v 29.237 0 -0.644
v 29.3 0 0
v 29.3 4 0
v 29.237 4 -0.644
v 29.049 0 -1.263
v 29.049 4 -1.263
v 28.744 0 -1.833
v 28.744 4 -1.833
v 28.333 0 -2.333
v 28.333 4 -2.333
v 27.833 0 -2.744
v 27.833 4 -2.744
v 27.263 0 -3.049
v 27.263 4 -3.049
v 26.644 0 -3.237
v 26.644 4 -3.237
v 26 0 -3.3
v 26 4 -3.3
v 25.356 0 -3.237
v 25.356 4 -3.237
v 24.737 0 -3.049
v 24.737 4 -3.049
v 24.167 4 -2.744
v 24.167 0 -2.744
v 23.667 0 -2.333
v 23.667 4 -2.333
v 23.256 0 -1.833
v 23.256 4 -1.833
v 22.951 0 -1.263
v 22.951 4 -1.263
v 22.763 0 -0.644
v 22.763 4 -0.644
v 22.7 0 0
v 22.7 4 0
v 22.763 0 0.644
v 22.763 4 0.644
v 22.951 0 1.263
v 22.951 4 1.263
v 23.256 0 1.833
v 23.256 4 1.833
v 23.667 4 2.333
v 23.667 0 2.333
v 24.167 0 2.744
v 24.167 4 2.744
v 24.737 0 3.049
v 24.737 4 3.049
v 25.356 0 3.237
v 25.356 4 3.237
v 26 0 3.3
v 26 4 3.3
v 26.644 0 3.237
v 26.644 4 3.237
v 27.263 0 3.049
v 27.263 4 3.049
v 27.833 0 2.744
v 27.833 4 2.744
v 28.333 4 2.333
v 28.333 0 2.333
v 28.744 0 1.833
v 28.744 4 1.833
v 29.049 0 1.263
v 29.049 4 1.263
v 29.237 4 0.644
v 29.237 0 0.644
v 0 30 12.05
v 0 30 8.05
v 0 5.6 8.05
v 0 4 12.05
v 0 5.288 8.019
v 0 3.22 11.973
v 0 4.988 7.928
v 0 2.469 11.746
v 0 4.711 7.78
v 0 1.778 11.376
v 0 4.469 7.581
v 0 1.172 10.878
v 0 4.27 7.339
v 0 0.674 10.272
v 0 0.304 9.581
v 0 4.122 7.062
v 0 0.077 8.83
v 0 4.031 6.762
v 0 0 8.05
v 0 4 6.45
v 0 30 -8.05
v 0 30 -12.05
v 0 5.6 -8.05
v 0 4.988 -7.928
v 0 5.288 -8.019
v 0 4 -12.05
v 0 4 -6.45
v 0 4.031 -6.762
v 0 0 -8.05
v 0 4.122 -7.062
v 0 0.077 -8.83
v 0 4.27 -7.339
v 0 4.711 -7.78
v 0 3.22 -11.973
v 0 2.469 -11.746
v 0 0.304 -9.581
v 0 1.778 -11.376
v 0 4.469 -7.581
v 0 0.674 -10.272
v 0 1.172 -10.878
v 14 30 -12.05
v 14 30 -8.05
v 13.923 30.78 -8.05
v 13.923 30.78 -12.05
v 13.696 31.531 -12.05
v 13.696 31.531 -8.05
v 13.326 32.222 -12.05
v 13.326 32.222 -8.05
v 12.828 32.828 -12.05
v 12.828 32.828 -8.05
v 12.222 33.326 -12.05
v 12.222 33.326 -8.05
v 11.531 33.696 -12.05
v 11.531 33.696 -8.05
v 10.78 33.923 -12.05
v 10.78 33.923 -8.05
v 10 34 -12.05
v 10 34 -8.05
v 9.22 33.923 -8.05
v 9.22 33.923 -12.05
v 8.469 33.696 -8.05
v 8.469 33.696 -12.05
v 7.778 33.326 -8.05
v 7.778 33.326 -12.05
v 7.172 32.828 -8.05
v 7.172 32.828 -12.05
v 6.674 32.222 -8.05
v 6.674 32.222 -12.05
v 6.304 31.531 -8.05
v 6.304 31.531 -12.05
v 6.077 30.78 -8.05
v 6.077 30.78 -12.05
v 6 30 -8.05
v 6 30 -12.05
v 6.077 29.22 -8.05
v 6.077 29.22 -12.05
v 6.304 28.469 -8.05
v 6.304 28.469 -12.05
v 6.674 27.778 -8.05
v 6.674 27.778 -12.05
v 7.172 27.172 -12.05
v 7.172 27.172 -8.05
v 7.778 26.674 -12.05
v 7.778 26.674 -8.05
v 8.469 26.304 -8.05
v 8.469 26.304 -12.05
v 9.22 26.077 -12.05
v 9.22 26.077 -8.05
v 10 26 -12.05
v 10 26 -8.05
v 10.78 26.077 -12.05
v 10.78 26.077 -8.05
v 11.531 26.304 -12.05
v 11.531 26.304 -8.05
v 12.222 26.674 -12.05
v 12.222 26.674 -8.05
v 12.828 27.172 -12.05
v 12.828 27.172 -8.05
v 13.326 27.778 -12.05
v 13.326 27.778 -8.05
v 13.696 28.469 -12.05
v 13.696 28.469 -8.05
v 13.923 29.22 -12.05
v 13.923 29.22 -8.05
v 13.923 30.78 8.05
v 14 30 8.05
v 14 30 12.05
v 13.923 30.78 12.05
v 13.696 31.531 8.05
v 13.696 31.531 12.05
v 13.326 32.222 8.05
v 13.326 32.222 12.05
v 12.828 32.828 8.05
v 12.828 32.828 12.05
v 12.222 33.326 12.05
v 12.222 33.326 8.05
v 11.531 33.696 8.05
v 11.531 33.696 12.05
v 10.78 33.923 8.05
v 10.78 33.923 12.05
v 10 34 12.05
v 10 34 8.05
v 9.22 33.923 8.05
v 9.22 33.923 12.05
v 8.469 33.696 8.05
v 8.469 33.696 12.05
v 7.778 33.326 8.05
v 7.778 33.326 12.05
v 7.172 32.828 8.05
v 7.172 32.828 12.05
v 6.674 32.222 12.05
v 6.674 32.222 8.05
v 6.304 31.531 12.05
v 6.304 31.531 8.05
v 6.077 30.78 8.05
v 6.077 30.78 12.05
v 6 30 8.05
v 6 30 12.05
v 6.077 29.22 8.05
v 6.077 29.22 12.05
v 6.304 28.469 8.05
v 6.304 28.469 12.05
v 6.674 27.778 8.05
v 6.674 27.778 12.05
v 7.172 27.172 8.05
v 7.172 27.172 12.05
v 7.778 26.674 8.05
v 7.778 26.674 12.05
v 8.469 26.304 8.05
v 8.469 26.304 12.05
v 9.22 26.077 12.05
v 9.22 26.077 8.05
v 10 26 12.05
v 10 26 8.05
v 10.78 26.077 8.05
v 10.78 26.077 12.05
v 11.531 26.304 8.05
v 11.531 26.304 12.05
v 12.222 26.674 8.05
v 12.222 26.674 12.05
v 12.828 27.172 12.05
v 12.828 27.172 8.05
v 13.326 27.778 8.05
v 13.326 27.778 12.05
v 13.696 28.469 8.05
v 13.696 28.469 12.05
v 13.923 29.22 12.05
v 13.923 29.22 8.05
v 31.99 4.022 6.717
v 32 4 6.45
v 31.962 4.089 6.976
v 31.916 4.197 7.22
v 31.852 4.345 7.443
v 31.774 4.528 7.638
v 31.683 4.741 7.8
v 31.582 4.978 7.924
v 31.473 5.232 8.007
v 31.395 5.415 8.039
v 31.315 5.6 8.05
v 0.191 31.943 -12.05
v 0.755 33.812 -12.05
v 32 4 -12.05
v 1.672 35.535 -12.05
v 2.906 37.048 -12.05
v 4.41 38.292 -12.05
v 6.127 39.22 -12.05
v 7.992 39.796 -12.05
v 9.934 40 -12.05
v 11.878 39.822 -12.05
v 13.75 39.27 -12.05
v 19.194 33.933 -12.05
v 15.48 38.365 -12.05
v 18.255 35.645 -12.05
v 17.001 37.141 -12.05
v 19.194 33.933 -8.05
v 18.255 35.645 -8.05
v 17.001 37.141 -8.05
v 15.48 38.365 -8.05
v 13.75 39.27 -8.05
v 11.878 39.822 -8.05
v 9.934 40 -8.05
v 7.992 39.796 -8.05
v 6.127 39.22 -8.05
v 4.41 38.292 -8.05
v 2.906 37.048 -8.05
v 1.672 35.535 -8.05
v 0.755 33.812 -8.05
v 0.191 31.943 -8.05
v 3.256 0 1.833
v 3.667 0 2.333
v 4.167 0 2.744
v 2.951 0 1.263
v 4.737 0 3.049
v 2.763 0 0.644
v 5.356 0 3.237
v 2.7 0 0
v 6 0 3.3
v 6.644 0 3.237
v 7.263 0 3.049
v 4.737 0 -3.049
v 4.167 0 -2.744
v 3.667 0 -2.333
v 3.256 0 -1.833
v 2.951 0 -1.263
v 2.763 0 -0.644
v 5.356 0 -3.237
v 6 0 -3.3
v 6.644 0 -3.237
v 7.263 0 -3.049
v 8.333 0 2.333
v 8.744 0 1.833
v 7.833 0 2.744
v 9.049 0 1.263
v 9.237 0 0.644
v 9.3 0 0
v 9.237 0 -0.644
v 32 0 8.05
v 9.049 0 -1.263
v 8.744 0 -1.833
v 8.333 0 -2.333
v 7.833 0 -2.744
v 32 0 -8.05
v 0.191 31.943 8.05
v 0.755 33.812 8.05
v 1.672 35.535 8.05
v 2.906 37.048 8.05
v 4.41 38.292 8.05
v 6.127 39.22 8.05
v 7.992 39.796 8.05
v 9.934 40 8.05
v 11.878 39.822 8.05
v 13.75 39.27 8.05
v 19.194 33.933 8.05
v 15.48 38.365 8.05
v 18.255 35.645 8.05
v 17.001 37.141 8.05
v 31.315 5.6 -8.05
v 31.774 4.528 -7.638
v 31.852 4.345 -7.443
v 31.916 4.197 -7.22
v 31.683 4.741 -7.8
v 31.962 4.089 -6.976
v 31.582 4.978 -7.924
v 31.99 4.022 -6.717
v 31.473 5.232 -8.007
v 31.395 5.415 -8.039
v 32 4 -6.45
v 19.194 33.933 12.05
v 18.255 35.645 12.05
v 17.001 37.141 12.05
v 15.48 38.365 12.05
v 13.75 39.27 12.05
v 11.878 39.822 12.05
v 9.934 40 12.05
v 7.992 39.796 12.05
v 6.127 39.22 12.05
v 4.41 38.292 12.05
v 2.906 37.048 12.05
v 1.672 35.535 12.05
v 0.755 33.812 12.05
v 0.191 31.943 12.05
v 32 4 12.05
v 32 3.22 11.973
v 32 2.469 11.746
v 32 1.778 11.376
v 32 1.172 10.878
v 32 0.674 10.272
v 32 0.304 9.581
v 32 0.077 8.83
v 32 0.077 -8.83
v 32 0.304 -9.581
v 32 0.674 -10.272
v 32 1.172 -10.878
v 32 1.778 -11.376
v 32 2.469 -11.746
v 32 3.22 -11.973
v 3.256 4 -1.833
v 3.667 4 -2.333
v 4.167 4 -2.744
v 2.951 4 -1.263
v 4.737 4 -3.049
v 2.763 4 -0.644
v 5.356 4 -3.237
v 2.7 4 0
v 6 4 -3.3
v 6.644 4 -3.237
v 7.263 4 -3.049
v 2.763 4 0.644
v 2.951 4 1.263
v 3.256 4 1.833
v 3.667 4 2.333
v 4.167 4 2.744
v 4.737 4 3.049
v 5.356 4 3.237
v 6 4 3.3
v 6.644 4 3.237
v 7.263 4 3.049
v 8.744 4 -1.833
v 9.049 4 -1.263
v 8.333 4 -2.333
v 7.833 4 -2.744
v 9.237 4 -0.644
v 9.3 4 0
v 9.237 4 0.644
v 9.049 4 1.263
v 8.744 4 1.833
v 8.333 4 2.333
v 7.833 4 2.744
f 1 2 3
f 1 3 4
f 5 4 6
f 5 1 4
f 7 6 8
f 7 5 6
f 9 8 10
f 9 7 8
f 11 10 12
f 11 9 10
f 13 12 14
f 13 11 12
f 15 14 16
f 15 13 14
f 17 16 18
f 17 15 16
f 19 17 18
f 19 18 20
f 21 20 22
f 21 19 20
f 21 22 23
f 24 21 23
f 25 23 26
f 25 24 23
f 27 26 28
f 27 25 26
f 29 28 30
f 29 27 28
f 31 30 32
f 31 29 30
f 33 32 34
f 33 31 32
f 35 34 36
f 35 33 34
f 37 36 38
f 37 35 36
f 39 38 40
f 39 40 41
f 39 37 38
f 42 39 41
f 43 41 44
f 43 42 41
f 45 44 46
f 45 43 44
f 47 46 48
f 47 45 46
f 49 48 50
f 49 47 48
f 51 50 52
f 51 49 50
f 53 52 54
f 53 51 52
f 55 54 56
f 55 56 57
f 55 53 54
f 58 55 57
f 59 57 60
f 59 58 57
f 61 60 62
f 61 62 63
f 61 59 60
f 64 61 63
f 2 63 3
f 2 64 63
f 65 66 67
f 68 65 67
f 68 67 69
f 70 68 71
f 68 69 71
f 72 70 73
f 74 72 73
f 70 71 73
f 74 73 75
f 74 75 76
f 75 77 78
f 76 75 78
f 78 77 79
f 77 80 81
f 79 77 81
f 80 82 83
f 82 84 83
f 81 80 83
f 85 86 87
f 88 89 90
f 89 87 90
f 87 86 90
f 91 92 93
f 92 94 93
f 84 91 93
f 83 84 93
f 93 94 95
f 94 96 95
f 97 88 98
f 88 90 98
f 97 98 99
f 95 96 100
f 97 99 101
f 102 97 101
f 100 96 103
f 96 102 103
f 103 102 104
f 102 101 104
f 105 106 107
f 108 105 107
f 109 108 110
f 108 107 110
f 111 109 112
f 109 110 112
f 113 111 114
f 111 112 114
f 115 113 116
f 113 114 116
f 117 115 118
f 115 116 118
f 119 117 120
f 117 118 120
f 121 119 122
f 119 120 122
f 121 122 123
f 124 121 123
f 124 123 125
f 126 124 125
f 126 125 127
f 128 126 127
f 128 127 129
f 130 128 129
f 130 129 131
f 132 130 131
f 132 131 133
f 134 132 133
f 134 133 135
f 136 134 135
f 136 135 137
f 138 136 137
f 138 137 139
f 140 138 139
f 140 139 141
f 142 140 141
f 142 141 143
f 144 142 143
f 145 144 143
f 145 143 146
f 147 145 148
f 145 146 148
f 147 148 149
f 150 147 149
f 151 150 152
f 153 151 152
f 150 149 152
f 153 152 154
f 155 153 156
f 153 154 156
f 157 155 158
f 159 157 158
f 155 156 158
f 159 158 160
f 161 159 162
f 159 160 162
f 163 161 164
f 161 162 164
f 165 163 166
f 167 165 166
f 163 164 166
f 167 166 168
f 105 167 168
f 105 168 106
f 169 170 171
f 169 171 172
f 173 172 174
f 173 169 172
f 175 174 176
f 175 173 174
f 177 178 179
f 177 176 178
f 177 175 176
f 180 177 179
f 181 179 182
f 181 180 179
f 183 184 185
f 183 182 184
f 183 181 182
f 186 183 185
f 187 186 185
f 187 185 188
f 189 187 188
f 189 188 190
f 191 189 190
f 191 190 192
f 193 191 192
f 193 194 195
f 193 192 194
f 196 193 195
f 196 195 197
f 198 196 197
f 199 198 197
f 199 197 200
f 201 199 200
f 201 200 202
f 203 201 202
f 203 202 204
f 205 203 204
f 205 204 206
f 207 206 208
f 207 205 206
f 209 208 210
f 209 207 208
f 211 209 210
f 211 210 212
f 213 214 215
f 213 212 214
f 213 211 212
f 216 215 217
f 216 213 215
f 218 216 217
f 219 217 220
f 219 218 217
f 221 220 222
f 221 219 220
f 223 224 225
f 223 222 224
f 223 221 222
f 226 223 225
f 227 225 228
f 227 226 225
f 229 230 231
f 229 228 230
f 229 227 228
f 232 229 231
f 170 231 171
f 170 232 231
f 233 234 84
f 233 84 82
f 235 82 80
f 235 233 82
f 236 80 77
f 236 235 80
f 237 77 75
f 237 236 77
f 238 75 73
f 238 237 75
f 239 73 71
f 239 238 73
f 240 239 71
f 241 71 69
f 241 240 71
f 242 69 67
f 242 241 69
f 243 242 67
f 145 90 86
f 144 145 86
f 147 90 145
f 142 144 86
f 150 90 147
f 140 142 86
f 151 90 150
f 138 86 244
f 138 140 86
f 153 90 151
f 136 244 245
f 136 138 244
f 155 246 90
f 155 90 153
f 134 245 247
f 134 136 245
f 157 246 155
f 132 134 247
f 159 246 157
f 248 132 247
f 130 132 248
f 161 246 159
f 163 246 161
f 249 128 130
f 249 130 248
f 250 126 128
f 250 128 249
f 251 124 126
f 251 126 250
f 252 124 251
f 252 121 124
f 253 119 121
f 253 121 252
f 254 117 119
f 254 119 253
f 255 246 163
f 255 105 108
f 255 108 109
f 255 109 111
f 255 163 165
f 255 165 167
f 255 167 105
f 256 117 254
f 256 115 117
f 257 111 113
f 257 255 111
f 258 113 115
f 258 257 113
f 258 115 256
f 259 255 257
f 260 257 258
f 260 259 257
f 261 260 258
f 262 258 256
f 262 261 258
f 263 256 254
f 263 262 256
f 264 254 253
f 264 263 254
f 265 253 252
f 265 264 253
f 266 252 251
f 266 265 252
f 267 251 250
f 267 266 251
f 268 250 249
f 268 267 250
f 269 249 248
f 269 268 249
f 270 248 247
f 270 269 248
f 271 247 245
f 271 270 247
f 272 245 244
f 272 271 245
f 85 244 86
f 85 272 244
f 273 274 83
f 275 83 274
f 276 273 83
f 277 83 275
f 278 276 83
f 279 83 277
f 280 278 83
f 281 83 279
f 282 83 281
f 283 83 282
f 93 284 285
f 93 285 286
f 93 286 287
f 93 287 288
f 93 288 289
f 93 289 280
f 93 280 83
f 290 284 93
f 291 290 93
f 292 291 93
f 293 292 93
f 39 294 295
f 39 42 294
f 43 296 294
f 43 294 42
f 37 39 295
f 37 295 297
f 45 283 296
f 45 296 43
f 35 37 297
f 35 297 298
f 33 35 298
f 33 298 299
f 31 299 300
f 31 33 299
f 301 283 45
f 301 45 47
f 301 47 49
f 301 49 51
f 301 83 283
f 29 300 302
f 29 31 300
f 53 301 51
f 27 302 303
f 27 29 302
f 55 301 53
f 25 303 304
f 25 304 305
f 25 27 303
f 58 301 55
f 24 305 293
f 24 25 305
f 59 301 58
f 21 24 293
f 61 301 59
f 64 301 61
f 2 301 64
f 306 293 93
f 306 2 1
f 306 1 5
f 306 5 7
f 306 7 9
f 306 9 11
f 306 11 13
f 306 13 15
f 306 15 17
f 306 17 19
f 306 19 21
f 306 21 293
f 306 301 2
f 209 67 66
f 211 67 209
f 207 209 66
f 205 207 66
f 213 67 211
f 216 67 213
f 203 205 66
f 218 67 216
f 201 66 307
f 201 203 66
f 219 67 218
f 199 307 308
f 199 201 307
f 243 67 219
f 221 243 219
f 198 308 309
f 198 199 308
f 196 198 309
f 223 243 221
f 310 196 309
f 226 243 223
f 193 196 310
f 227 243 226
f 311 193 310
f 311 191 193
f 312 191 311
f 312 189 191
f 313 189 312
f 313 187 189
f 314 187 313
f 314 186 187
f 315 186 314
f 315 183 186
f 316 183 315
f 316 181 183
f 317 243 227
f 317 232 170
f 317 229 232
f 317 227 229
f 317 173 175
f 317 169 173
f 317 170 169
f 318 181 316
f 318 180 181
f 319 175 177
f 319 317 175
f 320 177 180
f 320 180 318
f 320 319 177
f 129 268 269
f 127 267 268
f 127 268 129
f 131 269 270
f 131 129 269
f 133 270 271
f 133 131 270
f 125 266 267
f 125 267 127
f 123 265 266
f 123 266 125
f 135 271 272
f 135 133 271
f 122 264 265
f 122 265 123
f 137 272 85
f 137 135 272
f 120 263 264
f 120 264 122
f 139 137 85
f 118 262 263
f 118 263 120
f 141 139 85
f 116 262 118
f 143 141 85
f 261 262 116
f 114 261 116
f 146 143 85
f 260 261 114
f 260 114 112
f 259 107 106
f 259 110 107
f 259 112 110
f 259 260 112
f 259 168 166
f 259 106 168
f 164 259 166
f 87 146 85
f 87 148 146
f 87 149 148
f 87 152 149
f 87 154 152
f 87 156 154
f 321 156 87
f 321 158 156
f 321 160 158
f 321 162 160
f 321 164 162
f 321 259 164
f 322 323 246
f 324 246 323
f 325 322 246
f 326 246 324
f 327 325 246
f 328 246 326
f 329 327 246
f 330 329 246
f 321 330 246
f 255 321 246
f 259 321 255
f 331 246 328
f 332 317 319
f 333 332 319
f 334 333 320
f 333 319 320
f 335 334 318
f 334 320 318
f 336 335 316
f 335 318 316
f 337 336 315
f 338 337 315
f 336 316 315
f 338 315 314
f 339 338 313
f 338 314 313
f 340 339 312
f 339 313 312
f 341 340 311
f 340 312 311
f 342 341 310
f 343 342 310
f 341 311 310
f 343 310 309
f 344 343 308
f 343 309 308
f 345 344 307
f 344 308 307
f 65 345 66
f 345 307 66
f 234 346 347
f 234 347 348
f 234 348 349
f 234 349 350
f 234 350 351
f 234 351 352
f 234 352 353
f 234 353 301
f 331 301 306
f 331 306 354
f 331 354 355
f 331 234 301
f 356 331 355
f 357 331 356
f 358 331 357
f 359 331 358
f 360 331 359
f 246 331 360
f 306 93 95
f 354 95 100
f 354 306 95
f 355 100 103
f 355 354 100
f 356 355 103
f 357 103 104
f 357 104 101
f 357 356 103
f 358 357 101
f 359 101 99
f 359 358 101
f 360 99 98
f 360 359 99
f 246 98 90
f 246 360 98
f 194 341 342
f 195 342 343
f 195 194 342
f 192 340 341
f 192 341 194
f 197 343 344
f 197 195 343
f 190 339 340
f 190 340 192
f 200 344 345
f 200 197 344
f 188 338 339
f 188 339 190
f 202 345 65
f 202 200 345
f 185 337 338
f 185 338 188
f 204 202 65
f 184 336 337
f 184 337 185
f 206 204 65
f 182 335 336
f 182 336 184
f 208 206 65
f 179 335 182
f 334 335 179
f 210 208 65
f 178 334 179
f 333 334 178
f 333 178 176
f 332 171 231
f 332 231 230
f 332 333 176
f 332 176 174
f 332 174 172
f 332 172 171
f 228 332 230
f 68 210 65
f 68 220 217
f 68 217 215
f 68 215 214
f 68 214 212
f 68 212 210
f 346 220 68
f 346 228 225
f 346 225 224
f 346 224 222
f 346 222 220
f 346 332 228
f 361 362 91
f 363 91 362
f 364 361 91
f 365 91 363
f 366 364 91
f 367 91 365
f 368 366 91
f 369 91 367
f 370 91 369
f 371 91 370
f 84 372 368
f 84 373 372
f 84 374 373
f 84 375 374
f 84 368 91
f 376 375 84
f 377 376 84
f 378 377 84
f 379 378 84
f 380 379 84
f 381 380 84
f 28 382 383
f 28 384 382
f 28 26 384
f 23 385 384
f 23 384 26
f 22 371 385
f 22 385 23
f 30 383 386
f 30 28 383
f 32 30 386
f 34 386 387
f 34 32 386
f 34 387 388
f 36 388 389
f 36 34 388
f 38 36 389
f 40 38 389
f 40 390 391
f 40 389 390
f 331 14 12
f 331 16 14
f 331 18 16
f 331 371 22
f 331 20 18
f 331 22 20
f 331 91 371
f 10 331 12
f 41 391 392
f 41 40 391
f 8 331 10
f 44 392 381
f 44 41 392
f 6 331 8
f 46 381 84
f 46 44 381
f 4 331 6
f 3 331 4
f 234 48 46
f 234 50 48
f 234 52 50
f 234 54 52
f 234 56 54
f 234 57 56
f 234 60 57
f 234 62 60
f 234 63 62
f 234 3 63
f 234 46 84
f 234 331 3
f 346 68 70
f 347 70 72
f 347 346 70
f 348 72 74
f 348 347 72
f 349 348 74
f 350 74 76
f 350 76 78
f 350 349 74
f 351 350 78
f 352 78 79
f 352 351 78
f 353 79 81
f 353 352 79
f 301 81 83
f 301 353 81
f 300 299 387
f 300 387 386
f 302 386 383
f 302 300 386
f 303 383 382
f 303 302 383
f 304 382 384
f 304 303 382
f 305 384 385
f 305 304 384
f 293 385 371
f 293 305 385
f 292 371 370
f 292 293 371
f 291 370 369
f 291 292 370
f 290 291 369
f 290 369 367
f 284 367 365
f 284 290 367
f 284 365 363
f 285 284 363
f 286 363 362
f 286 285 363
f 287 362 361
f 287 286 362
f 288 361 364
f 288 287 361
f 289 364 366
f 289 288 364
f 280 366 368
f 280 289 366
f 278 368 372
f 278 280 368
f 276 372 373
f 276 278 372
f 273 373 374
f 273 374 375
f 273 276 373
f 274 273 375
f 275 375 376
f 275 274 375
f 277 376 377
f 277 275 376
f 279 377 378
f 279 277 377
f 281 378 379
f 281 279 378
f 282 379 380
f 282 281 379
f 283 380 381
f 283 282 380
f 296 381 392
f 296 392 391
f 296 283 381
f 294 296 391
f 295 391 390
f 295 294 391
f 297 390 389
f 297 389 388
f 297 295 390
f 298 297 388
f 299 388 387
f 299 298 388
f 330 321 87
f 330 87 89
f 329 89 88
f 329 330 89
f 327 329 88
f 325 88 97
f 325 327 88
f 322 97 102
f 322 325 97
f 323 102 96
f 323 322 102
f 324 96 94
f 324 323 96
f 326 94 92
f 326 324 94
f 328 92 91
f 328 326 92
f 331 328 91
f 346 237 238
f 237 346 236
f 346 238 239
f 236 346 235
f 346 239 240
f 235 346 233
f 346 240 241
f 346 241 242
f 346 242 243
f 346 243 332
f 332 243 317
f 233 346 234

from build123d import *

# Parameters (mm, degrees)
BOSS_EXTRUDE1_DEPTH      = 32
BOSS_EXTRUDE1_DEPTH_BACK = 32
CUT_EXTRUDE1_DEPTH       = 32
CUT_EXTRUDE1_DEPTH_BACK  = 32
SKETCH2_W                = 96.2
SKETCH2_H                = 76.1
CUT_EXTRUDE2_DEPTH       = 16.1
CUT_EXTRUDE2_DEPTH_BACK  = 16.1
SKETCH3_R                = 4
CUT_EXTRUDE3_DEPTH       = 4
CUT_EXTRUDE3_DEPTH_BACK  = 4
SKETCH4_R                = 3.3
CUT_EXTRUDE4_DEPTH       = 4
CUT_EXTRUDE4_DEPTH_BACK  = 4
SKETCH5_R                = 3.3


with BuildPart() as part:
    # Sketch1 → Boss-Extrude1 (new, two sides: drawn at the far end of the back side and taken through both)
    with BuildSketch(Plane(origin=(0, 0, 0), x_dir=(0, 0, -1), z_dir=(1, 0, 0)).offset(-BOSS_EXTRUDE1_DEPTH_BACK)):
        with BuildLine():
            Line((-8.05, 0), (8.05, 0))
            ThreePointArc((8.05, 0), (10.878427125, 1.171572875), (12.05, 4))
            Line((12.05, 4), (12.05, 40))
            Line((12.05, 40), (8.05, 40))
            Line((8.05, 40), (8.05, 5.6))
            ThreePointArc((8.05, 5.6), (7.58137085, 4.46862915), (6.45, 4))
            Line((6.45, 4), (-6.45, 4))
            ThreePointArc((-6.45, 4), (-7.58137085, 4.46862915), (-8.05, 5.6))
            Line((-8.05, 5.6), (-8.05, 40))
            Line((-8.05, 40), (-12.05, 40))
            Line((-12.05, 40), (-12.05, 4))
            ThreePointArc((-12.05, 4), (-10.878427125, 1.171572875), (-8.05, 0))
        make_face()
    extrude(amount=BOSS_EXTRUDE1_DEPTH + BOSS_EXTRUDE1_DEPTH_BACK)

    # Sketch2 → Cut-Extrude1 (cut, two sides: drawn at the far end of the back side and taken through both)
    with BuildSketch(Plane.XY.offset(-CUT_EXTRUDE1_DEPTH_BACK)):
        with Locations((0, 21.95)):
            Rectangle(SKETCH2_W, SKETCH2_H)
        with BuildLine():
            Line((0, 30), (0, 0))
            Line((0, 0), (32, 0))
            Line((32, 0), (32, 4))
            Line((32, 4), (19.19395406, 33.933345743))
            ThreePointArc((19.19395406, 33.933345743), (7.9924568, 39.796416197), (0, 30))
        make_face(mode=Mode.SUBTRACT)
    extrude(amount=CUT_EXTRUDE1_DEPTH + CUT_EXTRUDE1_DEPTH_BACK, mode=Mode.SUBTRACT)

    # Sketch3 → Cut-Extrude2 (cut, two sides: drawn at the far end of the back side and taken through both)
    with BuildSketch(Plane.XY.offset(-CUT_EXTRUDE2_DEPTH_BACK)):
        with Locations((10, 30)):
            Circle(SKETCH3_R)
    extrude(amount=CUT_EXTRUDE2_DEPTH + CUT_EXTRUDE2_DEPTH_BACK, mode=Mode.SUBTRACT)

    # Sketch4 → Cut-Extrude3 (cut, two sides: drawn at the far end of the back side and taken through both)
    with BuildSketch(Plane(origin=(0, 0, 0), x_dir=(1, 0, 0), z_dir=(0, 1, 0)).offset(-CUT_EXTRUDE3_DEPTH_BACK)):
        with Locations((6, 0)):
            Circle(SKETCH4_R)
    extrude(amount=CUT_EXTRUDE3_DEPTH + CUT_EXTRUDE3_DEPTH_BACK, mode=Mode.SUBTRACT)

    # Sketch5 → Cut-Extrude4 (cut, two sides: drawn at the far end of the back side and taken through both)
    with BuildSketch(Plane(origin=(0, 0, 0), x_dir=(1, 0, 0), z_dir=(0, 1, 0)).offset(-CUT_EXTRUDE4_DEPTH_BACK)):
        with Locations((26, 0)):
            Circle(SKETCH5_R)
    extrude(amount=CUT_EXTRUDE4_DEPTH + CUT_EXTRUDE4_DEPTH_BACK, mode=Mode.SUBTRACT)


solid = part.part
